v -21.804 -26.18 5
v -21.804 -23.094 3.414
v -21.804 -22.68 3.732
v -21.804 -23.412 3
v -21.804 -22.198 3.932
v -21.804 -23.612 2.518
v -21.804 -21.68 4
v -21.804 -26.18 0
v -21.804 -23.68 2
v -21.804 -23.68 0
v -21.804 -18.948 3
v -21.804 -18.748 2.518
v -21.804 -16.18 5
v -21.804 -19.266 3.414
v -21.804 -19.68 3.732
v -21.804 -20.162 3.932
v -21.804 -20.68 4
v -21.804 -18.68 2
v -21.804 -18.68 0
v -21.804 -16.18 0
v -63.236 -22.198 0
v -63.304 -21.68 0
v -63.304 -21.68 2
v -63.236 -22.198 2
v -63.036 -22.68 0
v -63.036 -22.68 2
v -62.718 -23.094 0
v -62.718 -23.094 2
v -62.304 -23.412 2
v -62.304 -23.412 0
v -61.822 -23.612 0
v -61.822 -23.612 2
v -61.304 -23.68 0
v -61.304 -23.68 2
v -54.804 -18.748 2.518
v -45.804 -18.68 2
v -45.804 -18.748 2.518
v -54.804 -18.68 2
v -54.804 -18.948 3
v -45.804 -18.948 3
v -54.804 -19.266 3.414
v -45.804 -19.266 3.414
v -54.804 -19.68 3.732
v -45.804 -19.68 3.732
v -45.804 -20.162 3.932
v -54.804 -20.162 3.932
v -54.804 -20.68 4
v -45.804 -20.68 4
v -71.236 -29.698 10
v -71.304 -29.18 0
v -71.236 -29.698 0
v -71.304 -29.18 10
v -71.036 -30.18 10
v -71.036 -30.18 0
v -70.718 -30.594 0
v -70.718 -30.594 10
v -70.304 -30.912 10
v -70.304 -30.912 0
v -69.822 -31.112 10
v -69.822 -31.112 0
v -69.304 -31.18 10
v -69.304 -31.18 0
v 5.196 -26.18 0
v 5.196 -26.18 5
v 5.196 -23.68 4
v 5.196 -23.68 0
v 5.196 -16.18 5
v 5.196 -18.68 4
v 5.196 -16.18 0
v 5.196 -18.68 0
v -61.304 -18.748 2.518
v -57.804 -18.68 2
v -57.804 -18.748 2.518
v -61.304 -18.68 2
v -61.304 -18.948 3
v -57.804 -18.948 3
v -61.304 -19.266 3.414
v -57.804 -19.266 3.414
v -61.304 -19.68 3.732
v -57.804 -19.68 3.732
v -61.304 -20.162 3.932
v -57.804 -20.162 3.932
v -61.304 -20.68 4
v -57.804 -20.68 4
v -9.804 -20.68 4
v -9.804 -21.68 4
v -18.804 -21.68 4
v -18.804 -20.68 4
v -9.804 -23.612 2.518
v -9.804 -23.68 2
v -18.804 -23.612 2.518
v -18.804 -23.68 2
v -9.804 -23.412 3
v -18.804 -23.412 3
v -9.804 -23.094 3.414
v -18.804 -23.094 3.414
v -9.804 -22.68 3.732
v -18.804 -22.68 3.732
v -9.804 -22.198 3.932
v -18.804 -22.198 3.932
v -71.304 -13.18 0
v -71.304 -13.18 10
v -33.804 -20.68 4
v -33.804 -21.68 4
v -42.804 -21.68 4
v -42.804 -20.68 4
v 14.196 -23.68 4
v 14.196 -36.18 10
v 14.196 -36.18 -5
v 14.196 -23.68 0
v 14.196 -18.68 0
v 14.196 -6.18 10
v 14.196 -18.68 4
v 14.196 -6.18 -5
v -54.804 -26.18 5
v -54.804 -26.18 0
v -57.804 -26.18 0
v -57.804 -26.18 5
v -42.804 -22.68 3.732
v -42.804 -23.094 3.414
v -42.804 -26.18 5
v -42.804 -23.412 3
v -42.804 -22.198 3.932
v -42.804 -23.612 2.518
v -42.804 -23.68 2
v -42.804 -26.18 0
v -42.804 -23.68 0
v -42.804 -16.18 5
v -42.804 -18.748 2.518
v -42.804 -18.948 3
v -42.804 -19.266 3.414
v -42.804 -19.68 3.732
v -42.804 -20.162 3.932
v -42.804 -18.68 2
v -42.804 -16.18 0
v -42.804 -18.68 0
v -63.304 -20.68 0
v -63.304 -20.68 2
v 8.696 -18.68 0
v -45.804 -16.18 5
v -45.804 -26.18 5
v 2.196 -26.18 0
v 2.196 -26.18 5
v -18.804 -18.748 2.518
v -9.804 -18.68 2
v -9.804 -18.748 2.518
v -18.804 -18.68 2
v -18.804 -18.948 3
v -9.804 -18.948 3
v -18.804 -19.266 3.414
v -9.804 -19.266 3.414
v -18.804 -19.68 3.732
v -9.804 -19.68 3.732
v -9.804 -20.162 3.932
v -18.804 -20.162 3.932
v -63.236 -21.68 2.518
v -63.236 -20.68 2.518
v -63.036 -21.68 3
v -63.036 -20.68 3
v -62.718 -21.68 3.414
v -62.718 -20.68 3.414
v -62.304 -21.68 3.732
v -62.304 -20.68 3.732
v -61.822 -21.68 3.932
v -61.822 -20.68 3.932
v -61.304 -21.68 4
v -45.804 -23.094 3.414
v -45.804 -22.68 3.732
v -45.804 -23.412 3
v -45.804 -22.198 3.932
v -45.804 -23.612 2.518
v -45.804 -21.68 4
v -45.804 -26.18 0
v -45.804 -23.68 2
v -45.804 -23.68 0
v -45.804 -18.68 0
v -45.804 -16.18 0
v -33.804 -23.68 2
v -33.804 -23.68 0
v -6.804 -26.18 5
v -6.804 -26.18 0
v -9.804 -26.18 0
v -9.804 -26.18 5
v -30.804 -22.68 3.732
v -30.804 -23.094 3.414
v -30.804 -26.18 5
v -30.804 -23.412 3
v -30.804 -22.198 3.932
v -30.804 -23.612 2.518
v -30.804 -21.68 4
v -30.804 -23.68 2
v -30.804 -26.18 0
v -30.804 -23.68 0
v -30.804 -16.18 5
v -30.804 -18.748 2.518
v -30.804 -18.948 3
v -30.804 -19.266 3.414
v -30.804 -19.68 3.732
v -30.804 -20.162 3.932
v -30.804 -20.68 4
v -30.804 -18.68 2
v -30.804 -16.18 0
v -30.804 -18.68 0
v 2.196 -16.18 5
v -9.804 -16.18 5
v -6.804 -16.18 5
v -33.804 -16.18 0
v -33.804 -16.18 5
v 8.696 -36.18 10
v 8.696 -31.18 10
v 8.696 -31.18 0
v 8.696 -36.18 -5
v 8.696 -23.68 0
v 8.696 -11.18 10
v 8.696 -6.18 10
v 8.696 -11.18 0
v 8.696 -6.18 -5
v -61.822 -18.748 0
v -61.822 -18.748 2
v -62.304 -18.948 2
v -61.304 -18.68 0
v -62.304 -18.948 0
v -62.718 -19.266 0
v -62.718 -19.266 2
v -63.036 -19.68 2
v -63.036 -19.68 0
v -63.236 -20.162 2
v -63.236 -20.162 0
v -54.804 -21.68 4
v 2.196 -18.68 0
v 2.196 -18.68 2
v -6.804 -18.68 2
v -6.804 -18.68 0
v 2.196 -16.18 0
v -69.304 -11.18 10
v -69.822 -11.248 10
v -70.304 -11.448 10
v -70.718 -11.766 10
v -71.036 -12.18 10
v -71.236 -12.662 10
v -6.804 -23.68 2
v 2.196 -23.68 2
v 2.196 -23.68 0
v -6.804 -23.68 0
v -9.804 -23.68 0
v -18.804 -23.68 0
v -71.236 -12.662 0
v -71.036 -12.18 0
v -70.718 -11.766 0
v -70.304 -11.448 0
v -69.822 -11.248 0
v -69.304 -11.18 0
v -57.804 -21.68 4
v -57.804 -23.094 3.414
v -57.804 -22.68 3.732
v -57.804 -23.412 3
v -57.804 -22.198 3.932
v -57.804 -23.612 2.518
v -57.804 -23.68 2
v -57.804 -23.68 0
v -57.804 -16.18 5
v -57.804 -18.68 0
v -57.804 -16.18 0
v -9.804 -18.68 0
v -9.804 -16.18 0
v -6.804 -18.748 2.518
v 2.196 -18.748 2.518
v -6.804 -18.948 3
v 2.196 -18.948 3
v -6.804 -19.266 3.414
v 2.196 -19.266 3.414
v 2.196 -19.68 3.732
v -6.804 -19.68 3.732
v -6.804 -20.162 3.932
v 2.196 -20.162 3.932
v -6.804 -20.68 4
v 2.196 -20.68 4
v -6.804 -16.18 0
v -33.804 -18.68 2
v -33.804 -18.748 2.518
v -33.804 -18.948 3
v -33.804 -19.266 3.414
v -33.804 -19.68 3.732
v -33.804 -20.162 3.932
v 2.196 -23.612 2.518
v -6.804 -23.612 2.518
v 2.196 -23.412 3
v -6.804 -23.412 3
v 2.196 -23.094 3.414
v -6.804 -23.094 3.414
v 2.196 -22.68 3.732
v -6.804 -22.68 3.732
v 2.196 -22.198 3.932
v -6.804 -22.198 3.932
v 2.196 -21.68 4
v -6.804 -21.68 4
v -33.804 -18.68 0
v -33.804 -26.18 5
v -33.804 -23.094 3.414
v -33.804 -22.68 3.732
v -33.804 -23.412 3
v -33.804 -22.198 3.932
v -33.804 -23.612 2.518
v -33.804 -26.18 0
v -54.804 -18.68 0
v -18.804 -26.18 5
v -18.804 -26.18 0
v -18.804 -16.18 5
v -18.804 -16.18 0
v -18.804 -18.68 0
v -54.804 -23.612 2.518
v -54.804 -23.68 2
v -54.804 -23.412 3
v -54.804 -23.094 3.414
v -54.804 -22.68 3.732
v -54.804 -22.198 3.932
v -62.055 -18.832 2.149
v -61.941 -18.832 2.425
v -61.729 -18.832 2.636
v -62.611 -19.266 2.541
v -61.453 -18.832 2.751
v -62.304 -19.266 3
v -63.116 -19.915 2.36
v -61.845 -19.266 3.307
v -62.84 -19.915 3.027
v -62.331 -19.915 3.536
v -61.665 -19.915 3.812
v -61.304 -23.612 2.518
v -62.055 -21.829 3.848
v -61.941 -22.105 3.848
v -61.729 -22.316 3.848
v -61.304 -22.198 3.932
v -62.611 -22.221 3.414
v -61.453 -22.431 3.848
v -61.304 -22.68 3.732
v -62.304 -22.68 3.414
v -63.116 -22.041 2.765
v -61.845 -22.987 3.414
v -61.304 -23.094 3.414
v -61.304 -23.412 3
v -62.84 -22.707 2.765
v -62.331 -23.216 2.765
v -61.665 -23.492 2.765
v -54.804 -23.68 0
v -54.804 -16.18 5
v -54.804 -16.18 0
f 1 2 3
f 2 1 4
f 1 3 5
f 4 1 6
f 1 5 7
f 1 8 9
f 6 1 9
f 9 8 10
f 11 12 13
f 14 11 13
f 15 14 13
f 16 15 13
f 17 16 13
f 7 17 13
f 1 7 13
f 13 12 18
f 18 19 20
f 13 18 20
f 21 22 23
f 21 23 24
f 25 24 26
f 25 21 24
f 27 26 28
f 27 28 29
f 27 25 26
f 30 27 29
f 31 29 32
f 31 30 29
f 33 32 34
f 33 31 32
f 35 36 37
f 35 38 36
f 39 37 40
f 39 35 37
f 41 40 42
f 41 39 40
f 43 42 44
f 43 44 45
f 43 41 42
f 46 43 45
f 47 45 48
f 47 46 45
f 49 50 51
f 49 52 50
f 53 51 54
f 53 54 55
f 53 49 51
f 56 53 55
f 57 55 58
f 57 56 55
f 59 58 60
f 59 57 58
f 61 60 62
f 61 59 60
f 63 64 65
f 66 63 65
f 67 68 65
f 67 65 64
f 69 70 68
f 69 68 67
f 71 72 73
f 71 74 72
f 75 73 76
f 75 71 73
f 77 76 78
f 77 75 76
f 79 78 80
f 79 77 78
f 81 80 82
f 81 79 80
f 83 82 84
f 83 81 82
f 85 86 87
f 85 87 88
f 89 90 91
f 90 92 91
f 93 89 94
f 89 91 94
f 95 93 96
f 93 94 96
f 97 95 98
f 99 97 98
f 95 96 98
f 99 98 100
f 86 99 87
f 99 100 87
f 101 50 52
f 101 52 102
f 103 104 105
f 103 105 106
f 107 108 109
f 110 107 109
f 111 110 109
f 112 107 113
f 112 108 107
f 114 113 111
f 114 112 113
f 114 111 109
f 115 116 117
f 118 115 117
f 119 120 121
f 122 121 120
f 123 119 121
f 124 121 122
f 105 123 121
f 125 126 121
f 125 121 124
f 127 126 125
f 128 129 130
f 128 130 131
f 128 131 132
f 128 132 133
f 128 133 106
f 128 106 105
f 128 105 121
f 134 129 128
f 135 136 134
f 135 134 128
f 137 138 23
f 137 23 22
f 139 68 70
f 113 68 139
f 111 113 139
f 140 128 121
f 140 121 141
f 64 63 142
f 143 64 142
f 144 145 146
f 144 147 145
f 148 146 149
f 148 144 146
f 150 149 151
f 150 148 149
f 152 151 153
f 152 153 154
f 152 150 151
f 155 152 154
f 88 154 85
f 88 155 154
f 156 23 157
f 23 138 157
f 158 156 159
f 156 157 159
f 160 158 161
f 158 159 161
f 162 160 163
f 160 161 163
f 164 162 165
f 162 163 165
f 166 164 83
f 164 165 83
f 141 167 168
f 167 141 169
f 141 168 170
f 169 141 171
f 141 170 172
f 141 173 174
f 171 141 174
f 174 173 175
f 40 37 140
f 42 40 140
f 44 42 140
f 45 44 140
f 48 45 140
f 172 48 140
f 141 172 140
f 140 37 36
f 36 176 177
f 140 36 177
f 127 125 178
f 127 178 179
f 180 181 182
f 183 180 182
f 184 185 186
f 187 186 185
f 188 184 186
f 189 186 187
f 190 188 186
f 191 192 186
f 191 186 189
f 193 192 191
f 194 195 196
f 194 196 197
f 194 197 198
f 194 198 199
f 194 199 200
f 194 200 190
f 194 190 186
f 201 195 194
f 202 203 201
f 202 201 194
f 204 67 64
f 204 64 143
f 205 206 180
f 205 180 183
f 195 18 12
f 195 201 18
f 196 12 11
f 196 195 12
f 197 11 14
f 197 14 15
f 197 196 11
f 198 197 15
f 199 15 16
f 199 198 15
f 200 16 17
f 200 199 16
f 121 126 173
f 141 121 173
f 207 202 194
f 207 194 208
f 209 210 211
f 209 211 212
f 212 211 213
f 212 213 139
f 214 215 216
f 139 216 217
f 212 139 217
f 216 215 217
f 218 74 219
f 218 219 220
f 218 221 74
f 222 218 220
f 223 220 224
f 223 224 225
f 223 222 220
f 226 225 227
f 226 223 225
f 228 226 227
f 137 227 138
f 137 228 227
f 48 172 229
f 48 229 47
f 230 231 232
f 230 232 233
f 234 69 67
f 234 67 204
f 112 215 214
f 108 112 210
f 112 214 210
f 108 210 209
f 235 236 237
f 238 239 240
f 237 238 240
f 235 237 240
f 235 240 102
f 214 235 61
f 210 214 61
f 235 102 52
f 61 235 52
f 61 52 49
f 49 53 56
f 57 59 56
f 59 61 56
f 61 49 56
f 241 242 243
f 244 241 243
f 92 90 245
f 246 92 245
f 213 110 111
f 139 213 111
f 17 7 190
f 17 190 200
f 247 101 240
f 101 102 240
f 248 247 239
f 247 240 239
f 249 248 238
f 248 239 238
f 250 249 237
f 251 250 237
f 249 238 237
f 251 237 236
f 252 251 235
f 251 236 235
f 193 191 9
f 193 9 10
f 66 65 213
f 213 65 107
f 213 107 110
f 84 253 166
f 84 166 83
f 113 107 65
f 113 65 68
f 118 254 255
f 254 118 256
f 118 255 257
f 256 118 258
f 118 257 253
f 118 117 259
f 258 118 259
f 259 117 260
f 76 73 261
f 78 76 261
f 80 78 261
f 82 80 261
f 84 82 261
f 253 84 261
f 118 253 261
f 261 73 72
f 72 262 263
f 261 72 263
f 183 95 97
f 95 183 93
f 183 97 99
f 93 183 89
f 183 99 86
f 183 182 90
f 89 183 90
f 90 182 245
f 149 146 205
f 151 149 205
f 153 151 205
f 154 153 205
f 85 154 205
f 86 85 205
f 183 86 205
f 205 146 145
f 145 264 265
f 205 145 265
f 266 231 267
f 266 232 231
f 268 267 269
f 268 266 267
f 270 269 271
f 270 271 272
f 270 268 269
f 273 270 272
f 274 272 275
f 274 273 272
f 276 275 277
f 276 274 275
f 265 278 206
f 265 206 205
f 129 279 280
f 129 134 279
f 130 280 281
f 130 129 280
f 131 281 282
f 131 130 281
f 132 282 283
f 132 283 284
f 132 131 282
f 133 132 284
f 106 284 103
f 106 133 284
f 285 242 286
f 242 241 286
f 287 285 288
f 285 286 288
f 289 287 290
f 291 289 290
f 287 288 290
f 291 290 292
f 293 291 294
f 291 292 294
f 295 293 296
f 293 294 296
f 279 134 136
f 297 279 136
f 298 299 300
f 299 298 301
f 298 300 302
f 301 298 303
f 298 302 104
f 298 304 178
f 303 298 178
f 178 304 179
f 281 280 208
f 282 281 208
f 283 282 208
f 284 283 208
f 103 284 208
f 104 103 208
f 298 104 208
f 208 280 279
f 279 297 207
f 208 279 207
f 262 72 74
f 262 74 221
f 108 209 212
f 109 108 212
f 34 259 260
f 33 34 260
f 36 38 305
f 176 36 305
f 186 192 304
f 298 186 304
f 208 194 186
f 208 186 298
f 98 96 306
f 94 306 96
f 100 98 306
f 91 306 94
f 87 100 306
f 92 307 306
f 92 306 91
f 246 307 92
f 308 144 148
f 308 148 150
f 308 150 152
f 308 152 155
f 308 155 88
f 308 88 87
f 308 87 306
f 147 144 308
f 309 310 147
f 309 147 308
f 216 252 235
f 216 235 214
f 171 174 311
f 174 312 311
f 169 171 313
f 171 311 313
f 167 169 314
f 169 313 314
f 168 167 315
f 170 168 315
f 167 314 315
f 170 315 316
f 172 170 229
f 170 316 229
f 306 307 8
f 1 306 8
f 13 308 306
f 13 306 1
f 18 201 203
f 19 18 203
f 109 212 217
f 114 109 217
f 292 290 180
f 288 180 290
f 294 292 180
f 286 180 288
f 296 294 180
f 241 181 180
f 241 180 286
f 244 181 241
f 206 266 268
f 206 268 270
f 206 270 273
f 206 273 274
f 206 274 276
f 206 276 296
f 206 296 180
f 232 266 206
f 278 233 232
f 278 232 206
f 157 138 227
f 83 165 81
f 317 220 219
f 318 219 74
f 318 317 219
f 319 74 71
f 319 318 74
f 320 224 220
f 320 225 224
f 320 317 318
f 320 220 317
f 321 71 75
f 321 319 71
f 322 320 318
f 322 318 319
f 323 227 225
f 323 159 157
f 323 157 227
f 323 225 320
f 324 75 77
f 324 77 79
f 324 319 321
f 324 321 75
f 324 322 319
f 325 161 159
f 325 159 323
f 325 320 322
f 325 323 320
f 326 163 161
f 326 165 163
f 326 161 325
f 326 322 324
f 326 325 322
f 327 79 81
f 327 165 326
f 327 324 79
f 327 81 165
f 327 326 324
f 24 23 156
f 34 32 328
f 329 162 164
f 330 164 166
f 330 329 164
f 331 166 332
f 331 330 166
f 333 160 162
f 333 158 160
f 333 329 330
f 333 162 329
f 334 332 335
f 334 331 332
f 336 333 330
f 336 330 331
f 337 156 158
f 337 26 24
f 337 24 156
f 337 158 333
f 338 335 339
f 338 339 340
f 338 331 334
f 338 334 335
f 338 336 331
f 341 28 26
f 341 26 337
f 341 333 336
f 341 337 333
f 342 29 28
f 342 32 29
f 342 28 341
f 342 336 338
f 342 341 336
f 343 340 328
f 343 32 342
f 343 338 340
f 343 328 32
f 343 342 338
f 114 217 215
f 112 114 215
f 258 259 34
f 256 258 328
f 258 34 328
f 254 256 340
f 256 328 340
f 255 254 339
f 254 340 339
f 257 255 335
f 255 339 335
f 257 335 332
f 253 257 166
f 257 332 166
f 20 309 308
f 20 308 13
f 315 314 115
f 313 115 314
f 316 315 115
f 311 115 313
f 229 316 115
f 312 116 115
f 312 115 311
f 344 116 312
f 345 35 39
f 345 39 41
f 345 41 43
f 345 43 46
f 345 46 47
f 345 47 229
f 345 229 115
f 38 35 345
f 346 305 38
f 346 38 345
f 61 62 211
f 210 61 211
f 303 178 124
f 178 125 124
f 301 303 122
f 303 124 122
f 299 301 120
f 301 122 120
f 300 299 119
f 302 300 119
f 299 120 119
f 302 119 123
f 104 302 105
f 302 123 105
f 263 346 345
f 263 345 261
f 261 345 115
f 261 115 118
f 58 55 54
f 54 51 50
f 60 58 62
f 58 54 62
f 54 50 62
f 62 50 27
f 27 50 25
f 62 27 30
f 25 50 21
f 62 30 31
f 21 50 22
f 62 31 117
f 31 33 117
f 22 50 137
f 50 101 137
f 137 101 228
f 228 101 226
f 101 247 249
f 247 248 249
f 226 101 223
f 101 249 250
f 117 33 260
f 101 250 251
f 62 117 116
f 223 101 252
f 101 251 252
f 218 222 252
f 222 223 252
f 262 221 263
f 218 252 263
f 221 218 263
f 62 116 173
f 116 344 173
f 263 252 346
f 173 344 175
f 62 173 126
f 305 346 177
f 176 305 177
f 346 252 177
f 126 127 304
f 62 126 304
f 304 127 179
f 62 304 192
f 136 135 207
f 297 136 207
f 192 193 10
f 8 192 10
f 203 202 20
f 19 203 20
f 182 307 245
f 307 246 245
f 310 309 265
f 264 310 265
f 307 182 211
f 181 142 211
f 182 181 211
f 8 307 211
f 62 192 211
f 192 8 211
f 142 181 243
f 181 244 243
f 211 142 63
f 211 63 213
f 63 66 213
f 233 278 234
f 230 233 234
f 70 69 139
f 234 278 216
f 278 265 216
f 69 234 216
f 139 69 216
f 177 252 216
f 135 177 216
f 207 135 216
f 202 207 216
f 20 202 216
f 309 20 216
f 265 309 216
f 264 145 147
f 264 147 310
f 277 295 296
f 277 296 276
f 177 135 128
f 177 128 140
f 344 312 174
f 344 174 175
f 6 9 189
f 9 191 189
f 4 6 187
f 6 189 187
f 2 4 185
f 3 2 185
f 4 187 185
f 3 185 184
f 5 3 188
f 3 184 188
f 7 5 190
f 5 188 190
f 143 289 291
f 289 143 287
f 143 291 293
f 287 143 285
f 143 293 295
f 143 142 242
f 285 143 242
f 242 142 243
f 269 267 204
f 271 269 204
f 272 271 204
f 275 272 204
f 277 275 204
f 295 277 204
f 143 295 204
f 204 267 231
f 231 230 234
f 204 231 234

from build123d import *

# Parameters (mm, degrees)
SKETCH_1_W          = 80
SKETCH_1_H          = 20
EXTRUDE_1_DEPTH     = 10
FILLET_1_R          = 2
EXTRUDE_2_DEPTH     = 5.5
SKETCH_3_W          = 4
SKETCH_3_H          = 5
CUT_EXTRUDE_1_DEPTH = 77.5
SKETCH_4_W          = 3
SKETCH_4_H          = 10
CUT_EXTRUDE_2_DEPTH = 5
FILLET_2_R          = 2


with BuildPart() as part:
    # Эскиз1 → Бобышка-Вытянуть1 (new body)
    with BuildSketch(Plane.XY):
        with Locations((-31.304142693, -21.180034522)):
            Rectangle(SKETCH_1_W, SKETCH_1_H)
    extrude(amount=EXTRUDE_1_DEPTH)

    # Скругление1
    fillet_1_edges = [part.edges().sort_by_distance(p)[0] for p in [
        (-71.304142693, -11.180034522, 5),
        (-71.304142693, -31.180034522, 5),
    ]]
    fillet(fillet_1_edges, radius=FILLET_1_R)

    # Эскиз2 → Бобышка-Вытянуть2 (add)
    with BuildSketch(Plane(origin=(8.695857307, 0, 0), x_dir=(0, 0, -1), z_dir=(1, 0, 0))):
        Polygon((-10, -31.180034522), (-10, -36.180034522), (5, -36.180034522), (5, -6.180034522), (-10, -6.180034522), (-10, -11.180034522), align=None)
    extrude(amount=EXTRUDE_2_DEPTH)

    # Эскиз3 → Вырез-Вытянуть1 (cut)
    with BuildSketch(Plane(origin=(14.195857307, 0, 0), x_dir=(0, 0, -1), z_dir=(1, 0, 0))):
        with Locations((-2, -21.180034522)):
            Rectangle(SKETCH_3_W, SKETCH_3_H)
    extrude(amount=-CUT_EXTRUDE_1_DEPTH, mode=Mode.SUBTRACT)

    # Эскиз4 → Вырез-Вытянуть2 (cut)
    with BuildSketch(Plane(origin=(0, 0, 0), x_dir=(-1, 0, 0), z_dir=(0, 0, -1))):
        with Locations((-3.695857307, -21.180034522)):
            Rectangle(SKETCH_4_W, SKETCH_4_H)
        with Locations((56.304142693, -21.180034522)):
            Rectangle(SKETCH_4_W, SKETCH_4_H)
        with Locations((44.304142693, -21.180034522)):
            Rectangle(SKETCH_4_W, SKETCH_4_H)
        with Locations((32.304142693, -21.180034522)):
            Rectangle(SKETCH_4_W, SKETCH_4_H)
        with Locations((20.304142693, -21.180034522)):
            Rectangle(SKETCH_4_W, SKETCH_4_H)
        with Locations((8.304142693, -21.180034522)):
            Rectangle(SKETCH_4_W, SKETCH_4_H)
    extrude(amount=-CUT_EXTRUDE_2_DEPTH, mode=Mode.SUBTRACT)

    # Скругление2
    fillet_2_edges = [part.edges().sort_by_distance(p)[0] for p in [
        (-63.304142693, -23.680034522, 2),
        (-63.304142693, -21.180034522, 4),
        (-60.554142693, -23.680034522, 4),
        (-63.304142693, -18.680034522, 2),
        (-60.554142693, -18.680034522, 4),
        (-50.304142693, -18.680034522, 4),
        (-38.304142693, -18.680034522, 4),
        (-26.304142693, -18.680034522, 4),
        (-14.304142693, -18.680034522, 4),
        (-2.304142693, -18.680034522, 4),
        (-50.304142693, -23.680034522, 4),
        (-38.304142693, -23.680034522, 4),
        (-26.304142693, -23.680034522, 4),
        (-14.304142693, -23.680034522, 4),
        (-2.304142693, -23.680034522, 4),
    ]]
    fillet(fillet_2_edges, radius=FILLET_2_R)


solid = part.part
